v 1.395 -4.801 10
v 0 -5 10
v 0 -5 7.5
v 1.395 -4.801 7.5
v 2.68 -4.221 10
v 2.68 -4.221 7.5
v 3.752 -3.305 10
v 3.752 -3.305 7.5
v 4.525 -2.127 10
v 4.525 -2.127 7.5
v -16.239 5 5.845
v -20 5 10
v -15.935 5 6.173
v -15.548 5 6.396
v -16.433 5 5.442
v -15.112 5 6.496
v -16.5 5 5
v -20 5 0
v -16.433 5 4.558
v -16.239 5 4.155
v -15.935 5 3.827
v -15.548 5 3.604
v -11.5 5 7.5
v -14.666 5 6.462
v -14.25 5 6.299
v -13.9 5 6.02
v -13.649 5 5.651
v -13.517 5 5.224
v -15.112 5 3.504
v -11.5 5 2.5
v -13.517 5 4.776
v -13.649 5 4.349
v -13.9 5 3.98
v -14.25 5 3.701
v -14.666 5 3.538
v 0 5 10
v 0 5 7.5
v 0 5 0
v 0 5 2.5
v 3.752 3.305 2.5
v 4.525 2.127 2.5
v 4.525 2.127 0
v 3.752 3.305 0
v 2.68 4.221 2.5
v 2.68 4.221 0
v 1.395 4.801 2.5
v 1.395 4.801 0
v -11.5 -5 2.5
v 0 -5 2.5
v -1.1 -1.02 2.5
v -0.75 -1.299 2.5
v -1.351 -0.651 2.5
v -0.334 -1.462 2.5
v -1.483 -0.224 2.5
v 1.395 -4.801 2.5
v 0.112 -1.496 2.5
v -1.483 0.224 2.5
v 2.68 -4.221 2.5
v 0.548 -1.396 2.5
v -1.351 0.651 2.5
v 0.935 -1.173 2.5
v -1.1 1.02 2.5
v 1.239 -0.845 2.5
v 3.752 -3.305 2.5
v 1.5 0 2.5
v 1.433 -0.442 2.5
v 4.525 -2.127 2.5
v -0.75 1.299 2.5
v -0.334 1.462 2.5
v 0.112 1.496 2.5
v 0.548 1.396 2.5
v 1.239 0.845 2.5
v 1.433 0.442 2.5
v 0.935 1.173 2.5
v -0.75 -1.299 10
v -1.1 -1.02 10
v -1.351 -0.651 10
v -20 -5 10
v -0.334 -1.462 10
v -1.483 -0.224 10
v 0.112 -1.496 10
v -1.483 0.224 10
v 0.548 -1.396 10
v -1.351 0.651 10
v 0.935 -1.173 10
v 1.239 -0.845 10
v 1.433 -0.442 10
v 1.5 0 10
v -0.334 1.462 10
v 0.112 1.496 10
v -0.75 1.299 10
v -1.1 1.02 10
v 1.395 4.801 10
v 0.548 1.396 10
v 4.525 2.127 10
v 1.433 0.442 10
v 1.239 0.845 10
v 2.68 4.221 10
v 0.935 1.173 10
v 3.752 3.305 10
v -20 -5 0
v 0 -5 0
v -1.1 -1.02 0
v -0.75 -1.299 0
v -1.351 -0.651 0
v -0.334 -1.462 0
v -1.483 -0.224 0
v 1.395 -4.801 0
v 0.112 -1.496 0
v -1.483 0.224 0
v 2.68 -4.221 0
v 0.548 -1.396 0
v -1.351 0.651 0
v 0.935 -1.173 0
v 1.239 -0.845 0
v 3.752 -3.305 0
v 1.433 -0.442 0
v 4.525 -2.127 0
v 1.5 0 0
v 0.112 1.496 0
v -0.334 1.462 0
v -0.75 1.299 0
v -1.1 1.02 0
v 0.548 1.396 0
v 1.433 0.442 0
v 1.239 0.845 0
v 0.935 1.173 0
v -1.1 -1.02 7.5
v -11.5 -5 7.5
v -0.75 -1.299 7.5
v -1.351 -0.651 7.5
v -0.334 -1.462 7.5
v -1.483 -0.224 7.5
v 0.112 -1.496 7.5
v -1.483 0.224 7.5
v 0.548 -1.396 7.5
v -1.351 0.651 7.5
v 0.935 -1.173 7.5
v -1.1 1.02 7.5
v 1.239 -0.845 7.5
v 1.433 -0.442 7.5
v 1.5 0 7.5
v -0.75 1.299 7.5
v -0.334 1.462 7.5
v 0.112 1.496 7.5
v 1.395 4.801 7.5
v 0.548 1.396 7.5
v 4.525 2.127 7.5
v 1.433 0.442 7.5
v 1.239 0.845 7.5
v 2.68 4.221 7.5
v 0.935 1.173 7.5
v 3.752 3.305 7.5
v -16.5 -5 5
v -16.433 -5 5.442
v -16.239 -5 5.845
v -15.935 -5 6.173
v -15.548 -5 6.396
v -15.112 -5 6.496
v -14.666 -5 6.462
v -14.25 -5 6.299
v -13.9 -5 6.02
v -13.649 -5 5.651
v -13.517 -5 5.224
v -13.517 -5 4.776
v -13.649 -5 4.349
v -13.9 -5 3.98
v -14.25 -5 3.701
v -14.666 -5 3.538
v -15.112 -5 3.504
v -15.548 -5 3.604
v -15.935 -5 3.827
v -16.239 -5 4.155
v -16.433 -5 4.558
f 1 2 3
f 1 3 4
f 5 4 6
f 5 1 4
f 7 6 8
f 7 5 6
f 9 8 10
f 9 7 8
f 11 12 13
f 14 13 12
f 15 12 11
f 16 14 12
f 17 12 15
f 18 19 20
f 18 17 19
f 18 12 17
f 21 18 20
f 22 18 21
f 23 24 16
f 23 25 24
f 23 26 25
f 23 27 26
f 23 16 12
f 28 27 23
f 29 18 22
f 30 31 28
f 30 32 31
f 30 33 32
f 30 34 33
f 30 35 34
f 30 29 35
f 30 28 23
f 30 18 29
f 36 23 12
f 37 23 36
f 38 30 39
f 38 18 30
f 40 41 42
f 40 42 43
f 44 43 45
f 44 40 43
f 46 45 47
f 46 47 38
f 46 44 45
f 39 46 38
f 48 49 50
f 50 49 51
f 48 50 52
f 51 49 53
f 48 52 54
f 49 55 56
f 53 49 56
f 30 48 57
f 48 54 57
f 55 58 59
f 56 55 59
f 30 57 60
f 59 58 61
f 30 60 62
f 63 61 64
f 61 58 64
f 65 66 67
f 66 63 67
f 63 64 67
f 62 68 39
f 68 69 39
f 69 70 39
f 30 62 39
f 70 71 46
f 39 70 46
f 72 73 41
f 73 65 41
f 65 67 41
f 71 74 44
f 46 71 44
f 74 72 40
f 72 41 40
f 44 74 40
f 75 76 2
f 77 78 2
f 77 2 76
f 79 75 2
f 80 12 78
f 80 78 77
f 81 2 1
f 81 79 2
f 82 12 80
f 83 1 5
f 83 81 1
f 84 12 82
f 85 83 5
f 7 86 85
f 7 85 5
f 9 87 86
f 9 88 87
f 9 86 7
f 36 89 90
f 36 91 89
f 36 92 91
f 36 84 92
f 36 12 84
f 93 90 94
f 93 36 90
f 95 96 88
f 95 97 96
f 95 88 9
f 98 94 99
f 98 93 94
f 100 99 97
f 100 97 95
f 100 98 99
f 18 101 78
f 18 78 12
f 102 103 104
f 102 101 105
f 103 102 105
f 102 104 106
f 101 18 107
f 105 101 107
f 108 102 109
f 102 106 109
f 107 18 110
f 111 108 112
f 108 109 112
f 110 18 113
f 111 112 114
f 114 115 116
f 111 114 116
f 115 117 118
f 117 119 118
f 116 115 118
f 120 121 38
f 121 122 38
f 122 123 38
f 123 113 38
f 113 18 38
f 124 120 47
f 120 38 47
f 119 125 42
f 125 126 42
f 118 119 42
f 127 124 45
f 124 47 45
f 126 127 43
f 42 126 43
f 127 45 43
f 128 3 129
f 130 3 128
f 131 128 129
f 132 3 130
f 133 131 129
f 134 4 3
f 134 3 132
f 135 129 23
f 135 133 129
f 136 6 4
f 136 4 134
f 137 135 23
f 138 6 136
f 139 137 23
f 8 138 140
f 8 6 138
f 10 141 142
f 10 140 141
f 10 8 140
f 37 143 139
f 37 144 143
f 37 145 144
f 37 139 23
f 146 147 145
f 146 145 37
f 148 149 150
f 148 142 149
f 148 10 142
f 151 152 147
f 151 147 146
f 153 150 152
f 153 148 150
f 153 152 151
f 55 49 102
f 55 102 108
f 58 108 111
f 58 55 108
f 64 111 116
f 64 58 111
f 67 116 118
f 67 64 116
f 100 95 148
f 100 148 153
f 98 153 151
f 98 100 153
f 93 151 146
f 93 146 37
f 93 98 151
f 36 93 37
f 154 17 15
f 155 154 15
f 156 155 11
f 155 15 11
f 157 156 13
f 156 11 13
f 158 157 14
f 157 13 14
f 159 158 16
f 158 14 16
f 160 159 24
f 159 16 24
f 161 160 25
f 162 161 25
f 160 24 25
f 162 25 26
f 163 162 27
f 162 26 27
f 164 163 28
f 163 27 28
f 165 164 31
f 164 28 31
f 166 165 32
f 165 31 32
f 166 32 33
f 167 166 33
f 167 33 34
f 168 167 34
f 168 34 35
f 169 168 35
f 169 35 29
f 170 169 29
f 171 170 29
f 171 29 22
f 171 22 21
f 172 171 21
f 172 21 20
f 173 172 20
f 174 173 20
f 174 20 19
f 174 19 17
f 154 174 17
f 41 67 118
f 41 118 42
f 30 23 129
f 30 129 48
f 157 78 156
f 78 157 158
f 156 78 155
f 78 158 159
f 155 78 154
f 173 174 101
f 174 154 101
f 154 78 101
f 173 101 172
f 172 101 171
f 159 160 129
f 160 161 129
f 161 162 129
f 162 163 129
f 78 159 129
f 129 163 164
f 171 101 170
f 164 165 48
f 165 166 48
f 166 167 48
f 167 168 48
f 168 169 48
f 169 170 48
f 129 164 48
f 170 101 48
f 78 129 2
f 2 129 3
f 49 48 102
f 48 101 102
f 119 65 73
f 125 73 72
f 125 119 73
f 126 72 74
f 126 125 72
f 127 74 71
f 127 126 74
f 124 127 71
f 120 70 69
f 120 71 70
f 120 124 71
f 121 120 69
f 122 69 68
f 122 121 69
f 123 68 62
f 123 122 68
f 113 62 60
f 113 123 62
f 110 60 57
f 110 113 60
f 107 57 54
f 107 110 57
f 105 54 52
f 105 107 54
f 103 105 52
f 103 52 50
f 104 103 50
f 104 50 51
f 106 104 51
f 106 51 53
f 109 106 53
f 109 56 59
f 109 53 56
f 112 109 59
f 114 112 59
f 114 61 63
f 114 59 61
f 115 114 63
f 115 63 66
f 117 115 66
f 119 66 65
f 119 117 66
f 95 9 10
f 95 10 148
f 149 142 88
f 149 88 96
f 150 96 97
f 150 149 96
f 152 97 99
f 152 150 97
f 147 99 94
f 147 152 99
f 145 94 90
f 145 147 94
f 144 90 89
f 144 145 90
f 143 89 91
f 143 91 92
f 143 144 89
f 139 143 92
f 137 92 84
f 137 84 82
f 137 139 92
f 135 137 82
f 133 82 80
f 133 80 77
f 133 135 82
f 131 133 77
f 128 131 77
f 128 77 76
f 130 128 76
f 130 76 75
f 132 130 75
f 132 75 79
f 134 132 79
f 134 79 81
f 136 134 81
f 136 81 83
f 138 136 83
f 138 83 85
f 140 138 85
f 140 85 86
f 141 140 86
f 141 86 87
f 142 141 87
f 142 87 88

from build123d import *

# Parameters (mm, degrees)
CROQUIS1_W              = 25
CROQUIS1_H              = 10
CROQUIS1_R              = 1.5
SALIENTE_EXTRUIR1_DEPTH = 10
CROQUIS2_R              = 1.5
CORTAR_EXTRUIR1_DEPTH   = 14
CROQUIS3_W              = 5
CROQUIS3_H              = 10
CORTAR_EXTRUIR2_DEPTH   = 16.5
CUT_EXTRUDE1_DEPTH      = 10


with BuildPart() as part:
    # Croquis1 → Saliente-Extruir1 (new body)
    with BuildSketch(Plane.XY):
        with Locations((-7.5, 0)):
            Rectangle(CROQUIS1_W, CROQUIS1_H)
        Circle(CROQUIS1_R, mode=Mode.SUBTRACT)
    extrude(amount=SALIENTE_EXTRUIR1_DEPTH)

    # Croquis2 → Cortar-Extruir1 (cut)
    with BuildSketch(Plane(origin=(0, 5, 0), x_dir=(1, 0, 0), z_dir=(0, 1, 0))):
        with Locations(Location((-15, -5, 0), (0, 0, 180))):
            Circle(CROQUIS2_R)
    extrude(amount=-CORTAR_EXTRUIR1_DEPTH, mode=Mode.SUBTRACT)

    # Croquis3 → Cortar-Extruir2 (cut)
    with BuildSketch(Plane(origin=(5, 0, 0), x_dir=(0, 0, -1), z_dir=(1, 0, 0))):
        with Locations((-5, 0)):
            Rectangle(CROQUIS3_W, CROQUIS3_H)
    extrude(amount=-CORTAR_EXTRUIR2_DEPTH, mode=Mode.SUBTRACT)

    # Sketch1 → Cut-Extrude1 (cut)
    with BuildSketch(Plane.XY.offset(10)):
        with BuildLine():
            Line((0, 5), (5.992915048, 5))
            Line((5.992915048, 5), (5.992915048, -6.748814934))
            Line((5.992915048, -6.748814934), (0, -5))
            ThreePointArc((0, -5), (2.680080756, -4.221038633), (4.525089765, -2.126866856))
            Line((4.525089765, -2.126866856), (4.525089765, 2.126866856))
            ThreePointArc((4.525089765, 2.126866856), (2.680080756, 4.221038633), (0, 5))
        make_face()
    extrude(amount=-CUT_EXTRUDE1_DEPTH, mode=Mode.SUBTRACT)


solid = part.part
